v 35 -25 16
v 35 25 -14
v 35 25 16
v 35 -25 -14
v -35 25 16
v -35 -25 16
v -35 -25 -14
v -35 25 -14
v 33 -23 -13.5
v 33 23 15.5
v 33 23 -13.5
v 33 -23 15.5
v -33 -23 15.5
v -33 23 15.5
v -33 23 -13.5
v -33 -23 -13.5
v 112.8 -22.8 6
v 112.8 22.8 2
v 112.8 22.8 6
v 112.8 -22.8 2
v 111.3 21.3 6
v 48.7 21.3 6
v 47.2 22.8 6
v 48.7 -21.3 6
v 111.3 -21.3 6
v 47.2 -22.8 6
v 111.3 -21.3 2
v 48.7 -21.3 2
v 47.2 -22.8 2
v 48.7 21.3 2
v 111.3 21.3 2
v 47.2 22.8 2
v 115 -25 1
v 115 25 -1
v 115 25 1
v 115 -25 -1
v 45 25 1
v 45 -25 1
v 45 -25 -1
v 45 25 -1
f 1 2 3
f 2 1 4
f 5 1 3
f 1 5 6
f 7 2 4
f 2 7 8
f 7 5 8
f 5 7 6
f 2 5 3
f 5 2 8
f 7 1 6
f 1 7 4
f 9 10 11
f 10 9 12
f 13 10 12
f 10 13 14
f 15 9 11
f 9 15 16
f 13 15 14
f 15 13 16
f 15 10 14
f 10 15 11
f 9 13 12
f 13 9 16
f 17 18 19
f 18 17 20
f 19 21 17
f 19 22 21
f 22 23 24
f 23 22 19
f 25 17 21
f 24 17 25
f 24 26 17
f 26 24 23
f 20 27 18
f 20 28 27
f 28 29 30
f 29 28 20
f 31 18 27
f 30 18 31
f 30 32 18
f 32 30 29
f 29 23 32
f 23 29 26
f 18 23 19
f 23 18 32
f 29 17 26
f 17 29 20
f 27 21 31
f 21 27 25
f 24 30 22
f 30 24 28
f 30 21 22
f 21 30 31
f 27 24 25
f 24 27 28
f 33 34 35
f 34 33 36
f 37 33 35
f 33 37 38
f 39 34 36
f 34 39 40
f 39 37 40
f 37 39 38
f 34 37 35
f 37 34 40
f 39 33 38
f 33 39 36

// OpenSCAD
// Two-part enclosure for a small electronics board (e.g. Arduino temperature logger)
// Both parts are modelled in their print orientation, side by side on the bed.

$fn = 64;

// ---------- Part 1: Box (open top) ----------
box_outer_x = 70;   // outer width  (X)
box_outer_y = 50;   // outer depth  (Y)
box_outer_z = 30;   // outer height (Z)
box_wall    = 2;    // side wall thickness
box_floor   = 2;    // floor thickness

// ---------- Part 2: Lid (printed upside down) ----------
lid_plate_x   = 70;    // plate width  (X)
lid_plate_y   = 50;    // plate depth  (Y)
lid_plate_z   = 2;     // plate thickness (Z)
lid_wall      = 1.5;   // lip wall thickness
lip_height    = 4;     // lip height above plate
lip_outer_x   = 65.6;  // lip outer width  (X)
lip_outer_y   = 45.6;  // lip outer depth  (Y)

// ---------- Layout ----------
gap = 10;  // gap between the two parts along X

// Box is centred on the origin in X and Y.
// Lid is placed on the +X side of the box, 10 mm away from the box's +X face.
lid_x_offset = box_outer_x / 2 + gap + lid_plate_x / 2;

// ---------- Part 1: Box ----------
module box() {
    // Outer solid
    module outer() { cube([box_outer_x, box_outer_y, box_outer_z], center = true); }
    // Cavity: 2 mm walls, 2 mm floor, open top (cut extends 1 mm past the top face)
    module cavity() { cube([box_outer_x - 2 * box_wall,
                   box_outer_y - 2 * box_wall,
                   box_outer_z - box_floor + 1],
                  center = true); }
    // Shift cavity so its floor sits 2 mm above z = 0 and it is centred in X/Y
    translate([0, 0, box_floor / 2]) {
        difference() {
            outer();
            cavity();
        }
    }
}

// ---------- Part 2: Lid (printed upside down) ----------
module lid() {
    // Plate lying flat on the bed (z = 0 to z = 2)
    module plate() { cube([lid_plate_x, lid_plate_y, lid_plate_z], center = true); }
    // Lip: 1.5 mm thick wall, 4 mm tall, outer 65.6 x 45.6, centred on the plate
    // The lip sits on top of the plate (z = 2 to z = 6)
    module lip_outer() { cube([lip_outer_x, lip_outer_y, lip_height], center = true); }
    module lip_inner() { cube([lip_outer_x - 2 * lid_wall,
                      lip_outer_y - 2 * lid_wall,
                      lip_height + 1],
                     center = true); }
    // Position lip so its base is at z = lid_plate_z (top of plate)
    translate([0, 0, lid_plate_z + lip_height / 2]) {
        difference() {
            lip_outer();
            lip_inner();
        }
    }
    // Union plate and lip
    union() {
        plate();
        translate([0, 0, lid_plate_z + lip_height / 2]) {
            difference() {
                lip_outer();
                lip_inner();
            }
        }
    }
}

// ---------- Place both parts on the bed ----------
// Box: centred on origin
box();

// Lid: shifted to +X side
translate([lid_x_offset, 0, 0]) {
    lid();
}
